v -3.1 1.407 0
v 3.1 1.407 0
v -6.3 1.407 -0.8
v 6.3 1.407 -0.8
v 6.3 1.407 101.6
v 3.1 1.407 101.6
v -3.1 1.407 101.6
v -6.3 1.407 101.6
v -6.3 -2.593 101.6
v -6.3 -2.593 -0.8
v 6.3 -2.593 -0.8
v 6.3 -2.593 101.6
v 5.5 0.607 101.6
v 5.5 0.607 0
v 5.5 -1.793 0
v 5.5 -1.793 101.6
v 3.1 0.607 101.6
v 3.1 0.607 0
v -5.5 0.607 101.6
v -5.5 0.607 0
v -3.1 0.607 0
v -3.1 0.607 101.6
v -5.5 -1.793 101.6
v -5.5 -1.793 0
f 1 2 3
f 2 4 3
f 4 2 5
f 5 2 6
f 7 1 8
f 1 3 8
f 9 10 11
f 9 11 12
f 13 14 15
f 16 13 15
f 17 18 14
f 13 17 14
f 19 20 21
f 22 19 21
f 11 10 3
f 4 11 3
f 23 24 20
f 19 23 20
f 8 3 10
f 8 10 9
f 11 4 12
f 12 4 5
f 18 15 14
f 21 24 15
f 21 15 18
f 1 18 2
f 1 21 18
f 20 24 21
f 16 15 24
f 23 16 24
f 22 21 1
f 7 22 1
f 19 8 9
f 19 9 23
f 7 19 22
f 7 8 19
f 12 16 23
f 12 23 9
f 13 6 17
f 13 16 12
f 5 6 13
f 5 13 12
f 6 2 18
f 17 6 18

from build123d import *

# Parameters (mm, degrees)
BOSS_EXTRUDE1_DEPTH = 101.6
SKETCH2_W           = 0.8
SKETCH2_H           = 4
BOSS_EXTRUDE2_DEPTH = 12.6


with BuildPart() as part:
    # Sketch1 → Boss-Extrude1 (new body)
    with BuildSketch(Plane.XY):
        Polygon((3.1, 1.407251622), (3.1, 0.607251622), (5.5, 0.607251622), (5.5, -1.792748378), (-5.5, -1.792748378), (-5.5, 0.607251622), (-3.1, 0.607251622), (-3.1, 1.407251622), (-6.3, 1.407251622), (-6.3, -2.592748378), (6.3, -2.592748378), (6.3, 1.407251622), align=None)
    extrude(amount=BOSS_EXTRUDE1_DEPTH)

    # Sketch2 → Boss-Extrude2 (add)
    with BuildSketch(Plane.ZY.offset(6.3)):
        with Locations((-0.4, -0.592748378)):
            Rectangle(SKETCH2_W, SKETCH2_H)
    extrude(amount=-BOSS_EXTRUDE2_DEPTH)


solid = part.part
